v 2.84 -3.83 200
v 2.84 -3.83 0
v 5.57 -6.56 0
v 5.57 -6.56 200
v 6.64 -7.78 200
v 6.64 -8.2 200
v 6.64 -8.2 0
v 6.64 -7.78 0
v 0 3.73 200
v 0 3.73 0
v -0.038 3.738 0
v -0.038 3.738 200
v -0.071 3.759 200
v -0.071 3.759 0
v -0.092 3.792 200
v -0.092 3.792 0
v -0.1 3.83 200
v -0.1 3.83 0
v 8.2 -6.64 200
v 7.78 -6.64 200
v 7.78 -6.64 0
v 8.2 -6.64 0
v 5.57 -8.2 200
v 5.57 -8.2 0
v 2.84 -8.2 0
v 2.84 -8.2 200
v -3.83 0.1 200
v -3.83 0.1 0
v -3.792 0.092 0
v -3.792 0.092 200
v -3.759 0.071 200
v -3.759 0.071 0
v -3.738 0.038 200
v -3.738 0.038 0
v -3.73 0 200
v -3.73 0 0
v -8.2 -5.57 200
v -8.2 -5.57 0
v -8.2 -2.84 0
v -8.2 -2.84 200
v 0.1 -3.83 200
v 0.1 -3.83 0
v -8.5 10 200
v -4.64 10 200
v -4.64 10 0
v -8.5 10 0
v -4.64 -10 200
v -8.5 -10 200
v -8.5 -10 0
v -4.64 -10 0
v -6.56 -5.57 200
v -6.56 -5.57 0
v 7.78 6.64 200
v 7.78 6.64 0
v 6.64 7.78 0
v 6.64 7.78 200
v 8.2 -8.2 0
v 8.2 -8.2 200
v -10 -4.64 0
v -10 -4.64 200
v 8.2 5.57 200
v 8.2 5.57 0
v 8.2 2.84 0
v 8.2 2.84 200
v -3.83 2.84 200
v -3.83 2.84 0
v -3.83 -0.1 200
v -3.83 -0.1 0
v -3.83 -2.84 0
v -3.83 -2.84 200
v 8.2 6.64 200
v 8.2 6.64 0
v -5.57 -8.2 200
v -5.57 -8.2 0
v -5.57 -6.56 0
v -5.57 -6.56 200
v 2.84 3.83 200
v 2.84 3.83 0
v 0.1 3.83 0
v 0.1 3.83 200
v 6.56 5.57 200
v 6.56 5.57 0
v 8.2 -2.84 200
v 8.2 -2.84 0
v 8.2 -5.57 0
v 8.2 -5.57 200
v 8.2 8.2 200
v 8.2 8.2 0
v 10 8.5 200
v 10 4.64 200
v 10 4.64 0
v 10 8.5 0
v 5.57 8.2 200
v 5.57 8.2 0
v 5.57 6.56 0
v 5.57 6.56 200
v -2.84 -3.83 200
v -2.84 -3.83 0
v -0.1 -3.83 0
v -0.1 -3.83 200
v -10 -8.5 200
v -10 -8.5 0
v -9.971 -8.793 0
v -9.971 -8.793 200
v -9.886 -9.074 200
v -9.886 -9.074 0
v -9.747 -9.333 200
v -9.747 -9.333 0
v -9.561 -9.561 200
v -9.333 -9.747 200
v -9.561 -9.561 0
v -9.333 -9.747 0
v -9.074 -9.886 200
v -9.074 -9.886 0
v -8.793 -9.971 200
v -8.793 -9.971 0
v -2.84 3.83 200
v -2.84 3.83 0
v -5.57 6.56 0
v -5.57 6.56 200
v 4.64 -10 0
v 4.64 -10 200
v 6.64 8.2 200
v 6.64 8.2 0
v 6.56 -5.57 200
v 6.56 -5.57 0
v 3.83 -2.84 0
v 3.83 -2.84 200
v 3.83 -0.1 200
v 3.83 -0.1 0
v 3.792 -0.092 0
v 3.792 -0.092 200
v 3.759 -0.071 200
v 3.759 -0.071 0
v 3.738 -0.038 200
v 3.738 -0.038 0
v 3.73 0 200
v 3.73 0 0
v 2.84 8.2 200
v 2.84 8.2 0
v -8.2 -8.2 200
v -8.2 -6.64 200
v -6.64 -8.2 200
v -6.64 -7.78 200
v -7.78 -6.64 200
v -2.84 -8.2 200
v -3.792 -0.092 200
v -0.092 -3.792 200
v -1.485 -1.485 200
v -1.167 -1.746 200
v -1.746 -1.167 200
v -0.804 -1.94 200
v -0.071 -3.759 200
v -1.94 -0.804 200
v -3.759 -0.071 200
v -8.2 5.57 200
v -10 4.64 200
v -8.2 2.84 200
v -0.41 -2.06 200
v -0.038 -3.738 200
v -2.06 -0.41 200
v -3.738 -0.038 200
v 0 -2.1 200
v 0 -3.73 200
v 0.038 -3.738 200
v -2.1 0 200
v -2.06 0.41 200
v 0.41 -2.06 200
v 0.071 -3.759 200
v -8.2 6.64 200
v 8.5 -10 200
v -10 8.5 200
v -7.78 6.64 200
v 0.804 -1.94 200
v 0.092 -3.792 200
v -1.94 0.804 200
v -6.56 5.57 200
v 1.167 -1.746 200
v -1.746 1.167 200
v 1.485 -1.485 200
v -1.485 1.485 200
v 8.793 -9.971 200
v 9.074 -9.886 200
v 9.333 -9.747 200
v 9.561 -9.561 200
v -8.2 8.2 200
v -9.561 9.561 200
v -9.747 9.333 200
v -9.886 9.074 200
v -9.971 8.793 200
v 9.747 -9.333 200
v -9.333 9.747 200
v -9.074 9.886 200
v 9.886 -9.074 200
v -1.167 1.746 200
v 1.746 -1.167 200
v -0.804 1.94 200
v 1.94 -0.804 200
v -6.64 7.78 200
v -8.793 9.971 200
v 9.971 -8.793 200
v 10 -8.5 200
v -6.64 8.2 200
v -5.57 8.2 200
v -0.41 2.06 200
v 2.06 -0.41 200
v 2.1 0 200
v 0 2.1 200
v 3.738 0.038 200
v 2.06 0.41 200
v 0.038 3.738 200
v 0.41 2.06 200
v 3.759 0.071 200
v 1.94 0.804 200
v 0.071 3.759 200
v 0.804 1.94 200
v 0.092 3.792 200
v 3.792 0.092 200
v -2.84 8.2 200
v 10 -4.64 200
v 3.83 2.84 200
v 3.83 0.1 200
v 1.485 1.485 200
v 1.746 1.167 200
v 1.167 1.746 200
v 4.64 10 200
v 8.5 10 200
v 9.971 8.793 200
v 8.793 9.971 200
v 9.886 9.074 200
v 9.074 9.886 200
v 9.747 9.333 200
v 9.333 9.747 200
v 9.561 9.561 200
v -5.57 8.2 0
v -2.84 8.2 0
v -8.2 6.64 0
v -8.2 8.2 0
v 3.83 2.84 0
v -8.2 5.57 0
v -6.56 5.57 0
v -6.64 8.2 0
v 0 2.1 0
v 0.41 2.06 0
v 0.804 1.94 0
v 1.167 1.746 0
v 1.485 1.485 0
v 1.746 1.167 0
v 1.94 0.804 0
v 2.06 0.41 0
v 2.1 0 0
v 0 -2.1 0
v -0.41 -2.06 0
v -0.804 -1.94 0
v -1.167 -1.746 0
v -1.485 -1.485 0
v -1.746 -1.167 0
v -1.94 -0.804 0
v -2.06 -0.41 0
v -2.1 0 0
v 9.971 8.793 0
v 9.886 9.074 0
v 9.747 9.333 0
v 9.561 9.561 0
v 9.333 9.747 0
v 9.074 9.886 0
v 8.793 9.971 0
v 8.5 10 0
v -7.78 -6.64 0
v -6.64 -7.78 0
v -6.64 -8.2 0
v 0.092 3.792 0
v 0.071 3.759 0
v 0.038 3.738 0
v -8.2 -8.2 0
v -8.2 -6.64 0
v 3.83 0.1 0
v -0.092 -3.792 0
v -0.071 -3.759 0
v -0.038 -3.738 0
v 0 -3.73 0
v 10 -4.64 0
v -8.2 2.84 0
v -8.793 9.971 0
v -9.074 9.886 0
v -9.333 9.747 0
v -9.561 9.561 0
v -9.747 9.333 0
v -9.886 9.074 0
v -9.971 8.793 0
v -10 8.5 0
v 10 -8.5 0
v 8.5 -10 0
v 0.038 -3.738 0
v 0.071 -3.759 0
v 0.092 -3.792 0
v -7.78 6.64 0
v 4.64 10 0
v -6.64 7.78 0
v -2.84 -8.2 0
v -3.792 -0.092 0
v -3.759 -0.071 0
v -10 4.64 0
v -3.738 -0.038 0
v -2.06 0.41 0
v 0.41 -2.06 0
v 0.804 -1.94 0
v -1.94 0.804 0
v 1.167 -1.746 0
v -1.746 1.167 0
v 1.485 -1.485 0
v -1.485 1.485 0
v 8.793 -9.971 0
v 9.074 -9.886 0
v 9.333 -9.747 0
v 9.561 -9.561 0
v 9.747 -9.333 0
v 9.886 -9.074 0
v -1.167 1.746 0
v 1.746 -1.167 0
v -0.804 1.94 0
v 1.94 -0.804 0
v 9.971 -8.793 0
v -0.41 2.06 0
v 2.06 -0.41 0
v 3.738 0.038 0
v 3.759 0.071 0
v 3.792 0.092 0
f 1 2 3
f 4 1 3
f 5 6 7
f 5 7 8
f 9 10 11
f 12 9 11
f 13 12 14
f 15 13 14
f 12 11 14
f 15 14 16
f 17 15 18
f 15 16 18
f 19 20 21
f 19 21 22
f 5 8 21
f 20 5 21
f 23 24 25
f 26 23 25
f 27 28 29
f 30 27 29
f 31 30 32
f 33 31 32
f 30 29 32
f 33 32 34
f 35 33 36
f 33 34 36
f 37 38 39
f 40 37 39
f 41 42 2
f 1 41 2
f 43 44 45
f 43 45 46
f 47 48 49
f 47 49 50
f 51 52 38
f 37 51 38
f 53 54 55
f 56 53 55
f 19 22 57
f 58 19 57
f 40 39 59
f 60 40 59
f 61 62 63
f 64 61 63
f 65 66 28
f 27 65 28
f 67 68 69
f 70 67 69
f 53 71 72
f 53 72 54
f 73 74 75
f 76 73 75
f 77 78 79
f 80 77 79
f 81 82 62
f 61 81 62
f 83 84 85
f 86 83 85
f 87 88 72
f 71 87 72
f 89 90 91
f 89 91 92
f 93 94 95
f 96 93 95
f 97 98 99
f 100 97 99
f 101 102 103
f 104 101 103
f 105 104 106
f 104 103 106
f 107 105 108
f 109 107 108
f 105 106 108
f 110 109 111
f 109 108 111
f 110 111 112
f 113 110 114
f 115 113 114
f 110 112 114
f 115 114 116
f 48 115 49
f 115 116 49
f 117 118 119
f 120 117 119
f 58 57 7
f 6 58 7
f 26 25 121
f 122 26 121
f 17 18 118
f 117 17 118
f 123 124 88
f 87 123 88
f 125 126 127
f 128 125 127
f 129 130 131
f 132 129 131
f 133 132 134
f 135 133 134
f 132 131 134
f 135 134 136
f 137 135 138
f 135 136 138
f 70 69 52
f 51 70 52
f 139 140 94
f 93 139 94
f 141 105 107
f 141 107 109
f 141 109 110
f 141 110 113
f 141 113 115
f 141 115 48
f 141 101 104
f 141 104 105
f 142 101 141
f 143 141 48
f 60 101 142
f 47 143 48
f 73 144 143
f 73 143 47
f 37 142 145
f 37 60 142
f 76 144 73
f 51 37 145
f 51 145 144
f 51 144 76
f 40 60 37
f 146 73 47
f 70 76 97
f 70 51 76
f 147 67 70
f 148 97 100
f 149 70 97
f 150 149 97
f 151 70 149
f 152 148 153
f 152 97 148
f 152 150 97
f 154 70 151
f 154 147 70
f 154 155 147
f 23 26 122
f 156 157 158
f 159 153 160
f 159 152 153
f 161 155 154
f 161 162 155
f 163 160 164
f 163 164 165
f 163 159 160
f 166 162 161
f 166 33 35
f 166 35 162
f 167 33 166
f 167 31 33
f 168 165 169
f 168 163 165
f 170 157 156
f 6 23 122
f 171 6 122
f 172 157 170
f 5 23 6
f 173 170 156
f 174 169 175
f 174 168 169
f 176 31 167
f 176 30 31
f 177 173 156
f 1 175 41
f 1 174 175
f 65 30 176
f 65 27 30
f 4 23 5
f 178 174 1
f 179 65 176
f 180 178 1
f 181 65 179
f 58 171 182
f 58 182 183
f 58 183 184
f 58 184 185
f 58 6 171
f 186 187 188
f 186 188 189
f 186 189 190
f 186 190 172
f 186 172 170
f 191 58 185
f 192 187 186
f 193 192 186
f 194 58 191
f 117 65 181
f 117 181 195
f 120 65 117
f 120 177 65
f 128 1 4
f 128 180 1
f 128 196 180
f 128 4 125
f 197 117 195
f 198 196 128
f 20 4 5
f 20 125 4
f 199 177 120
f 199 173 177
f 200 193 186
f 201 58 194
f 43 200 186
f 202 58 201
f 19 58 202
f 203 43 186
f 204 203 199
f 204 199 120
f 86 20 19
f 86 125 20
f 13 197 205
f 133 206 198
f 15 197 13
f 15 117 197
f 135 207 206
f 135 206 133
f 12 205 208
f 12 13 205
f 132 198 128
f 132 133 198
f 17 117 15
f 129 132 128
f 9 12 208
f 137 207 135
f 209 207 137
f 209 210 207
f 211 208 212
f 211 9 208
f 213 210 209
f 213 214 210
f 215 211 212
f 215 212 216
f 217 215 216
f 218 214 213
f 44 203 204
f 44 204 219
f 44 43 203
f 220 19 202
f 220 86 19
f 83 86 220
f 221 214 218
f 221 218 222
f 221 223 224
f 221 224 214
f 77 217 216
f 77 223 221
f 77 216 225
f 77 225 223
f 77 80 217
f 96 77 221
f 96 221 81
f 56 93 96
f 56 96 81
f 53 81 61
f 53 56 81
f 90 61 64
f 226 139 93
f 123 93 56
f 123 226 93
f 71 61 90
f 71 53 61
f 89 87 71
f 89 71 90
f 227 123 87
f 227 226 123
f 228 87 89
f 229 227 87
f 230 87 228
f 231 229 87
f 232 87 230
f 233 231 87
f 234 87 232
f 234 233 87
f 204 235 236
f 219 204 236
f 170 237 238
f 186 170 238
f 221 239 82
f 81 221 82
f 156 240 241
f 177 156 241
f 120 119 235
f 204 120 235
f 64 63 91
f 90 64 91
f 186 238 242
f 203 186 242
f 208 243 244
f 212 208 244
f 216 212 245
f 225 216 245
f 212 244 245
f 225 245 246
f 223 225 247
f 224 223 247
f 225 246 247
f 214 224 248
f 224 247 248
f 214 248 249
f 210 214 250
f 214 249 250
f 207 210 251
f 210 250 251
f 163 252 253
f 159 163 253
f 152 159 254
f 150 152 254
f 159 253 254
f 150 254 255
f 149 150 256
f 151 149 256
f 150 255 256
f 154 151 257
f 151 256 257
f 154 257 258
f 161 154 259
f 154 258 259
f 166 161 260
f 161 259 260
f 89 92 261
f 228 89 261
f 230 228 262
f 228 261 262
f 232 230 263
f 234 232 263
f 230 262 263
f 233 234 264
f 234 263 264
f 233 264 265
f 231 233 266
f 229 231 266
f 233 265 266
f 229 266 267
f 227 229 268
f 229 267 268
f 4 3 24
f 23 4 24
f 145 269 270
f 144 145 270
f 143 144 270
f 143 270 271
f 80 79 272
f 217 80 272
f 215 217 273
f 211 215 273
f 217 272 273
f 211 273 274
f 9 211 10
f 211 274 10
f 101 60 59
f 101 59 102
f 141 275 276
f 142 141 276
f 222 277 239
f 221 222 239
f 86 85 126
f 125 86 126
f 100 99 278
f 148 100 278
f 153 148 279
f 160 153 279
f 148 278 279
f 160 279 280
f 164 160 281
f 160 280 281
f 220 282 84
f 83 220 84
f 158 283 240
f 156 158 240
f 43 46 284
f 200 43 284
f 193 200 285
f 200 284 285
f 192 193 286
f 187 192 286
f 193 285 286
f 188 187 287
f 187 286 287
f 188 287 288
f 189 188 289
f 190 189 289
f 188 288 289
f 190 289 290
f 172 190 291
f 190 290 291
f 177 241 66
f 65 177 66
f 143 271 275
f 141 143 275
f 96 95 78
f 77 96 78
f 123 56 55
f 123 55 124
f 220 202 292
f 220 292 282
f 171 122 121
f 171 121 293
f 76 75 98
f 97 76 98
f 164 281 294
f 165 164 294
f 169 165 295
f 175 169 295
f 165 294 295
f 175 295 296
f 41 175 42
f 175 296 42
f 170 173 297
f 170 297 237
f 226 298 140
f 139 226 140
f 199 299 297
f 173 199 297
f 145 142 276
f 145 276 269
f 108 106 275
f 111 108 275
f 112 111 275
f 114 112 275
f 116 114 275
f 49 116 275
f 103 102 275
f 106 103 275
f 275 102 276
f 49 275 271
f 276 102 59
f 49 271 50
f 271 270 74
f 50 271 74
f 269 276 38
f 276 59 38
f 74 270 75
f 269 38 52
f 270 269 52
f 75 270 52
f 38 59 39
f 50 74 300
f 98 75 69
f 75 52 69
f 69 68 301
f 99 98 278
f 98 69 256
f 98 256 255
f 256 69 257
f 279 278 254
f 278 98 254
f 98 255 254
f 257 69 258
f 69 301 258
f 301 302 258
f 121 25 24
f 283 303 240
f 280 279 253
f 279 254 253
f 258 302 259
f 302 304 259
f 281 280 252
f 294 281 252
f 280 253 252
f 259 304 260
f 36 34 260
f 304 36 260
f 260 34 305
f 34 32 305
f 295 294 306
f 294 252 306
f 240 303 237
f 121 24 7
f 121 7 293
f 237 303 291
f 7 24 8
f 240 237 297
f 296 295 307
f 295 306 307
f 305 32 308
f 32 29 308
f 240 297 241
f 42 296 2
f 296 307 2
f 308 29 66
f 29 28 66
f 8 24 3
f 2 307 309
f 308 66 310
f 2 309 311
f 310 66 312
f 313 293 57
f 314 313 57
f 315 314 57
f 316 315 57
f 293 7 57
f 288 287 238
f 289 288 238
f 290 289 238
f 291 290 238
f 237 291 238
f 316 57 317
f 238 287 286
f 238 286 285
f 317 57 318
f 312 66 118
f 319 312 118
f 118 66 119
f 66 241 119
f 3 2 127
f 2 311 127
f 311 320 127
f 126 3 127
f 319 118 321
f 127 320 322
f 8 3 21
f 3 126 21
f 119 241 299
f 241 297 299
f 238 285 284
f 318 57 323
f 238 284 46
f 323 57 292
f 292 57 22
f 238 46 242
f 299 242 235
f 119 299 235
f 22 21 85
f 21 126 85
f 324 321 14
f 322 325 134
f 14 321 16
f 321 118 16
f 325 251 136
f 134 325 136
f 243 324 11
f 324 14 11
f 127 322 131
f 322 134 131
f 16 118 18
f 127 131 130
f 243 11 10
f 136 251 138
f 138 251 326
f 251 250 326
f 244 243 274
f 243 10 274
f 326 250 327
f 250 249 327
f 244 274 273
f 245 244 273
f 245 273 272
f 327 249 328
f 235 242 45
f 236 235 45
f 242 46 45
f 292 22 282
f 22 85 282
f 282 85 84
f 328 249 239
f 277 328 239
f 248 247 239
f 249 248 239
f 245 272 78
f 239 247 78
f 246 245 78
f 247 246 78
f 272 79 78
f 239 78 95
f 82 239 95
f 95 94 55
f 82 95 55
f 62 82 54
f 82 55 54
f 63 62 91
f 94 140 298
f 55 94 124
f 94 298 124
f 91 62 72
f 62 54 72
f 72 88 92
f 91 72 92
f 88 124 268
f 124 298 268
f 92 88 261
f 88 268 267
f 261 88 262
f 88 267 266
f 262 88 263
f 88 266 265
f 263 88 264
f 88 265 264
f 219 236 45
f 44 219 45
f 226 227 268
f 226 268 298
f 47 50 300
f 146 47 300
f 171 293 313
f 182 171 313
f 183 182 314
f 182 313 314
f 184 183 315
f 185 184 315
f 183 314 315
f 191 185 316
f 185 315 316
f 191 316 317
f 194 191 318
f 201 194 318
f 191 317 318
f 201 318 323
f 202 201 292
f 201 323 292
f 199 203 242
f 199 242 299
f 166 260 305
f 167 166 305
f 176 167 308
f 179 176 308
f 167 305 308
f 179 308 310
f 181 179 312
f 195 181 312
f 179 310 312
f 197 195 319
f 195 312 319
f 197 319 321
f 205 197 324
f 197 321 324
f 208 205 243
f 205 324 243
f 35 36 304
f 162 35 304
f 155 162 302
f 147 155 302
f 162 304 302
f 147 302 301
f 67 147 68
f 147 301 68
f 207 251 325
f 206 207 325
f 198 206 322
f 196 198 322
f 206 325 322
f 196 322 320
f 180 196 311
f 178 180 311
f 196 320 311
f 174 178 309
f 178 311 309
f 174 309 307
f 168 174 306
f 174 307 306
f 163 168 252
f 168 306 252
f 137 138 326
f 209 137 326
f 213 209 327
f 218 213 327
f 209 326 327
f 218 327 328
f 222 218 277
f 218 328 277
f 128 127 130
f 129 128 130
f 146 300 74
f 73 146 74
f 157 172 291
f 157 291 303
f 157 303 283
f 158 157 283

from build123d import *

# Parameters (mm, degrees)
F1_DEPTH = 200


with BuildPart() as f1:
    # F0 (on Top) → F1 (new body)
    with BuildSketch(Plane.XY):
        with BuildLine():
            Line((0, -3.729949), (0, -2.1))
            ThreePointArc((0, -2.1), (-1.484924, -1.484924), (-2.1, 0))
            Line((-2.1, 0), (-3.729949, 0))
            ThreePointArc((-3.729949, 0), (-3.759239, -0.070711), (-3.829949, -0.1))
            Line((-3.829949, -0.1), (-3.829949, -2.84))
            Line((-3.829949, -2.84), (-6.56, -5.570051))
            Line((-6.56, -5.570051), (-8.2, -5.570051))
            Line((-8.2, -5.570051), (-8.2, -2.84))
            Line((-8.2, -2.84), (-10, -4.64))
            Line((-10, -4.64), (-10, -8.5))
            ThreePointArc((-10, -8.5), (-9.56066, -9.56066), (-8.5, -10))
            Line((-8.5, -10), (-4.64, -10))
            Line((-4.64, -10), (-2.84, -8.2))
            Line((-2.84, -8.2), (-5.570051, -8.2))
            Line((-5.570051, -8.2), (-5.570051, -6.56))
            Line((-5.570051, -6.56), (-2.84, -3.829949))
            Line((-2.84, -3.829949), (-0.1, -3.829949))
            ThreePointArc((-0.1, -3.829949), (-0.070711, -3.759239), (0, -3.729949))
        make_face()
        Polygon((-7.780051, -6.640051), (-6.640051, -7.780051), (-6.640051, -8.2), (-8.2, -8.2), (-8.2, -6.640051), align=None, mode=Mode.SUBTRACT)
        with BuildLine():
            ThreePointArc((-2.1, 0), (-1.484924, 1.484924), (0, 2.1))
            Line((0, 2.1), (0, 3.729949))
            ThreePointArc((0, 3.729949), (-0.070711, 3.759239), (-0.1, 3.829949))
            Line((-0.1, 3.829949), (-2.84, 3.829949))
            Line((-2.84, 3.829949), (-5.570051, 6.56))
            Line((-5.570051, 6.56), (-5.570051, 8.2))
            Line((-5.570051, 8.2), (-2.84, 8.2))
            Line((-2.84, 8.2), (-4.64, 10))
            Line((-4.64, 10), (-8.5, 10))
            ThreePointArc((-8.5, 10), (-9.56066, 9.56066), (-10, 8.5))
            Line((-10, 8.5), (-10, 4.64))
            Line((-10, 4.64), (-8.2, 2.84))
            Line((-8.2, 2.84), (-8.2, 5.570051))
            Line((-8.2, 5.570051), (-6.56, 5.570051))
            Line((-6.56, 5.570051), (-3.829949, 2.84))
            Line((-3.829949, 2.84), (-3.829949, 0.1))
            ThreePointArc((-3.829949, 0.1), (-3.759239, 0.070711), (-3.729949, 0))
            Line((-3.729949, 0), (-2.1, 0))
        make_face()
        Polygon((-6.640051, 7.780051), (-7.780051, 6.640051), (-8.2, 6.640051), (-8.2, 8.2), (-6.640051, 8.2), align=None, mode=Mode.SUBTRACT)
        with BuildLine():
            Line((3.729949, 0), (2.1, 0))
            ThreePointArc((2.1, 0), (1.484924, -1.484924), (0, -2.1))
            Line((0, -2.1), (0, -3.729949))
            ThreePointArc((0, -3.729949), (0.070711, -3.759239), (0.1, -3.829949))
            Line((0.1, -3.829949), (2.84, -3.829949))
            Line((2.84, -3.829949), (5.570051, -6.56))
            Line((5.570051, -6.56), (5.570051, -8.2))
            Line((5.570051, -8.2), (2.84, -8.2))
            Line((2.84, -8.2), (4.64, -10))
            Line((4.64, -10), (8.5, -10))
            ThreePointArc((8.5, -10), (9.56066, -9.56066), (10, -8.5))
            Line((10, -8.5), (10, -4.64))
            Line((10, -4.64), (8.2, -2.84))
            Line((8.2, -2.84), (8.2, -5.570051))
            Line((8.2, -5.570051), (6.56, -5.570051))
            Line((6.56, -5.570051), (3.829949, -2.84))
            Line((3.829949, -2.84), (3.829949, -0.1))
            ThreePointArc((3.829949, -0.1), (3.759239, -0.070711), (3.729949, 0))
        make_face()
        Polygon((6.640051, -7.780051), (7.780051, -6.640051), (8.2, -6.640051), (8.2, -8.2), (6.640051, -8.2), align=None, mode=Mode.SUBTRACT)
        with BuildLine():
            ThreePointArc((0, 2.1), (1.484924, 1.484924), (2.1, 0))
            Line((2.1, 0), (3.729949, 0))
            ThreePointArc((3.729949, 0), (3.759239, 0.070711), (3.829949, 0.1))
            Line((3.829949, 0.1), (3.829949, 2.84))
            Line((3.829949, 2.84), (6.56, 5.570051))
            Line((6.56, 5.570051), (8.2, 5.570051))
            Line((8.2, 5.570051), (8.2, 2.84))
            Line((8.2, 2.84), (10, 4.64))
            Line((10, 4.64), (10, 8.5))
            ThreePointArc((10, 8.5), (9.56066, 9.56066), (8.5, 10))
            Line((8.5, 10), (4.64, 10))
            Line((4.64, 10), (2.84, 8.2))
            Line((2.84, 8.2), (5.570051, 8.2))
            Line((5.570051, 8.2), (5.570051, 6.56))
            Line((5.570051, 6.56), (2.84, 3.829949))
            Line((2.84, 3.829949), (0.1, 3.829949))
            ThreePointArc((0.1, 3.829949), (0.070711, 3.759239), (0, 3.729949))
            Line((0, 3.729949), (0, 2.1))
        make_face()
        Polygon((6.640051, 8.2), (8.2, 8.2), (8.2, 6.640051), (7.780051, 6.640051), (6.640051, 7.780051), align=None, mode=Mode.SUBTRACT)
    extrude(amount=F1_DEPTH)


solid = f1.part
